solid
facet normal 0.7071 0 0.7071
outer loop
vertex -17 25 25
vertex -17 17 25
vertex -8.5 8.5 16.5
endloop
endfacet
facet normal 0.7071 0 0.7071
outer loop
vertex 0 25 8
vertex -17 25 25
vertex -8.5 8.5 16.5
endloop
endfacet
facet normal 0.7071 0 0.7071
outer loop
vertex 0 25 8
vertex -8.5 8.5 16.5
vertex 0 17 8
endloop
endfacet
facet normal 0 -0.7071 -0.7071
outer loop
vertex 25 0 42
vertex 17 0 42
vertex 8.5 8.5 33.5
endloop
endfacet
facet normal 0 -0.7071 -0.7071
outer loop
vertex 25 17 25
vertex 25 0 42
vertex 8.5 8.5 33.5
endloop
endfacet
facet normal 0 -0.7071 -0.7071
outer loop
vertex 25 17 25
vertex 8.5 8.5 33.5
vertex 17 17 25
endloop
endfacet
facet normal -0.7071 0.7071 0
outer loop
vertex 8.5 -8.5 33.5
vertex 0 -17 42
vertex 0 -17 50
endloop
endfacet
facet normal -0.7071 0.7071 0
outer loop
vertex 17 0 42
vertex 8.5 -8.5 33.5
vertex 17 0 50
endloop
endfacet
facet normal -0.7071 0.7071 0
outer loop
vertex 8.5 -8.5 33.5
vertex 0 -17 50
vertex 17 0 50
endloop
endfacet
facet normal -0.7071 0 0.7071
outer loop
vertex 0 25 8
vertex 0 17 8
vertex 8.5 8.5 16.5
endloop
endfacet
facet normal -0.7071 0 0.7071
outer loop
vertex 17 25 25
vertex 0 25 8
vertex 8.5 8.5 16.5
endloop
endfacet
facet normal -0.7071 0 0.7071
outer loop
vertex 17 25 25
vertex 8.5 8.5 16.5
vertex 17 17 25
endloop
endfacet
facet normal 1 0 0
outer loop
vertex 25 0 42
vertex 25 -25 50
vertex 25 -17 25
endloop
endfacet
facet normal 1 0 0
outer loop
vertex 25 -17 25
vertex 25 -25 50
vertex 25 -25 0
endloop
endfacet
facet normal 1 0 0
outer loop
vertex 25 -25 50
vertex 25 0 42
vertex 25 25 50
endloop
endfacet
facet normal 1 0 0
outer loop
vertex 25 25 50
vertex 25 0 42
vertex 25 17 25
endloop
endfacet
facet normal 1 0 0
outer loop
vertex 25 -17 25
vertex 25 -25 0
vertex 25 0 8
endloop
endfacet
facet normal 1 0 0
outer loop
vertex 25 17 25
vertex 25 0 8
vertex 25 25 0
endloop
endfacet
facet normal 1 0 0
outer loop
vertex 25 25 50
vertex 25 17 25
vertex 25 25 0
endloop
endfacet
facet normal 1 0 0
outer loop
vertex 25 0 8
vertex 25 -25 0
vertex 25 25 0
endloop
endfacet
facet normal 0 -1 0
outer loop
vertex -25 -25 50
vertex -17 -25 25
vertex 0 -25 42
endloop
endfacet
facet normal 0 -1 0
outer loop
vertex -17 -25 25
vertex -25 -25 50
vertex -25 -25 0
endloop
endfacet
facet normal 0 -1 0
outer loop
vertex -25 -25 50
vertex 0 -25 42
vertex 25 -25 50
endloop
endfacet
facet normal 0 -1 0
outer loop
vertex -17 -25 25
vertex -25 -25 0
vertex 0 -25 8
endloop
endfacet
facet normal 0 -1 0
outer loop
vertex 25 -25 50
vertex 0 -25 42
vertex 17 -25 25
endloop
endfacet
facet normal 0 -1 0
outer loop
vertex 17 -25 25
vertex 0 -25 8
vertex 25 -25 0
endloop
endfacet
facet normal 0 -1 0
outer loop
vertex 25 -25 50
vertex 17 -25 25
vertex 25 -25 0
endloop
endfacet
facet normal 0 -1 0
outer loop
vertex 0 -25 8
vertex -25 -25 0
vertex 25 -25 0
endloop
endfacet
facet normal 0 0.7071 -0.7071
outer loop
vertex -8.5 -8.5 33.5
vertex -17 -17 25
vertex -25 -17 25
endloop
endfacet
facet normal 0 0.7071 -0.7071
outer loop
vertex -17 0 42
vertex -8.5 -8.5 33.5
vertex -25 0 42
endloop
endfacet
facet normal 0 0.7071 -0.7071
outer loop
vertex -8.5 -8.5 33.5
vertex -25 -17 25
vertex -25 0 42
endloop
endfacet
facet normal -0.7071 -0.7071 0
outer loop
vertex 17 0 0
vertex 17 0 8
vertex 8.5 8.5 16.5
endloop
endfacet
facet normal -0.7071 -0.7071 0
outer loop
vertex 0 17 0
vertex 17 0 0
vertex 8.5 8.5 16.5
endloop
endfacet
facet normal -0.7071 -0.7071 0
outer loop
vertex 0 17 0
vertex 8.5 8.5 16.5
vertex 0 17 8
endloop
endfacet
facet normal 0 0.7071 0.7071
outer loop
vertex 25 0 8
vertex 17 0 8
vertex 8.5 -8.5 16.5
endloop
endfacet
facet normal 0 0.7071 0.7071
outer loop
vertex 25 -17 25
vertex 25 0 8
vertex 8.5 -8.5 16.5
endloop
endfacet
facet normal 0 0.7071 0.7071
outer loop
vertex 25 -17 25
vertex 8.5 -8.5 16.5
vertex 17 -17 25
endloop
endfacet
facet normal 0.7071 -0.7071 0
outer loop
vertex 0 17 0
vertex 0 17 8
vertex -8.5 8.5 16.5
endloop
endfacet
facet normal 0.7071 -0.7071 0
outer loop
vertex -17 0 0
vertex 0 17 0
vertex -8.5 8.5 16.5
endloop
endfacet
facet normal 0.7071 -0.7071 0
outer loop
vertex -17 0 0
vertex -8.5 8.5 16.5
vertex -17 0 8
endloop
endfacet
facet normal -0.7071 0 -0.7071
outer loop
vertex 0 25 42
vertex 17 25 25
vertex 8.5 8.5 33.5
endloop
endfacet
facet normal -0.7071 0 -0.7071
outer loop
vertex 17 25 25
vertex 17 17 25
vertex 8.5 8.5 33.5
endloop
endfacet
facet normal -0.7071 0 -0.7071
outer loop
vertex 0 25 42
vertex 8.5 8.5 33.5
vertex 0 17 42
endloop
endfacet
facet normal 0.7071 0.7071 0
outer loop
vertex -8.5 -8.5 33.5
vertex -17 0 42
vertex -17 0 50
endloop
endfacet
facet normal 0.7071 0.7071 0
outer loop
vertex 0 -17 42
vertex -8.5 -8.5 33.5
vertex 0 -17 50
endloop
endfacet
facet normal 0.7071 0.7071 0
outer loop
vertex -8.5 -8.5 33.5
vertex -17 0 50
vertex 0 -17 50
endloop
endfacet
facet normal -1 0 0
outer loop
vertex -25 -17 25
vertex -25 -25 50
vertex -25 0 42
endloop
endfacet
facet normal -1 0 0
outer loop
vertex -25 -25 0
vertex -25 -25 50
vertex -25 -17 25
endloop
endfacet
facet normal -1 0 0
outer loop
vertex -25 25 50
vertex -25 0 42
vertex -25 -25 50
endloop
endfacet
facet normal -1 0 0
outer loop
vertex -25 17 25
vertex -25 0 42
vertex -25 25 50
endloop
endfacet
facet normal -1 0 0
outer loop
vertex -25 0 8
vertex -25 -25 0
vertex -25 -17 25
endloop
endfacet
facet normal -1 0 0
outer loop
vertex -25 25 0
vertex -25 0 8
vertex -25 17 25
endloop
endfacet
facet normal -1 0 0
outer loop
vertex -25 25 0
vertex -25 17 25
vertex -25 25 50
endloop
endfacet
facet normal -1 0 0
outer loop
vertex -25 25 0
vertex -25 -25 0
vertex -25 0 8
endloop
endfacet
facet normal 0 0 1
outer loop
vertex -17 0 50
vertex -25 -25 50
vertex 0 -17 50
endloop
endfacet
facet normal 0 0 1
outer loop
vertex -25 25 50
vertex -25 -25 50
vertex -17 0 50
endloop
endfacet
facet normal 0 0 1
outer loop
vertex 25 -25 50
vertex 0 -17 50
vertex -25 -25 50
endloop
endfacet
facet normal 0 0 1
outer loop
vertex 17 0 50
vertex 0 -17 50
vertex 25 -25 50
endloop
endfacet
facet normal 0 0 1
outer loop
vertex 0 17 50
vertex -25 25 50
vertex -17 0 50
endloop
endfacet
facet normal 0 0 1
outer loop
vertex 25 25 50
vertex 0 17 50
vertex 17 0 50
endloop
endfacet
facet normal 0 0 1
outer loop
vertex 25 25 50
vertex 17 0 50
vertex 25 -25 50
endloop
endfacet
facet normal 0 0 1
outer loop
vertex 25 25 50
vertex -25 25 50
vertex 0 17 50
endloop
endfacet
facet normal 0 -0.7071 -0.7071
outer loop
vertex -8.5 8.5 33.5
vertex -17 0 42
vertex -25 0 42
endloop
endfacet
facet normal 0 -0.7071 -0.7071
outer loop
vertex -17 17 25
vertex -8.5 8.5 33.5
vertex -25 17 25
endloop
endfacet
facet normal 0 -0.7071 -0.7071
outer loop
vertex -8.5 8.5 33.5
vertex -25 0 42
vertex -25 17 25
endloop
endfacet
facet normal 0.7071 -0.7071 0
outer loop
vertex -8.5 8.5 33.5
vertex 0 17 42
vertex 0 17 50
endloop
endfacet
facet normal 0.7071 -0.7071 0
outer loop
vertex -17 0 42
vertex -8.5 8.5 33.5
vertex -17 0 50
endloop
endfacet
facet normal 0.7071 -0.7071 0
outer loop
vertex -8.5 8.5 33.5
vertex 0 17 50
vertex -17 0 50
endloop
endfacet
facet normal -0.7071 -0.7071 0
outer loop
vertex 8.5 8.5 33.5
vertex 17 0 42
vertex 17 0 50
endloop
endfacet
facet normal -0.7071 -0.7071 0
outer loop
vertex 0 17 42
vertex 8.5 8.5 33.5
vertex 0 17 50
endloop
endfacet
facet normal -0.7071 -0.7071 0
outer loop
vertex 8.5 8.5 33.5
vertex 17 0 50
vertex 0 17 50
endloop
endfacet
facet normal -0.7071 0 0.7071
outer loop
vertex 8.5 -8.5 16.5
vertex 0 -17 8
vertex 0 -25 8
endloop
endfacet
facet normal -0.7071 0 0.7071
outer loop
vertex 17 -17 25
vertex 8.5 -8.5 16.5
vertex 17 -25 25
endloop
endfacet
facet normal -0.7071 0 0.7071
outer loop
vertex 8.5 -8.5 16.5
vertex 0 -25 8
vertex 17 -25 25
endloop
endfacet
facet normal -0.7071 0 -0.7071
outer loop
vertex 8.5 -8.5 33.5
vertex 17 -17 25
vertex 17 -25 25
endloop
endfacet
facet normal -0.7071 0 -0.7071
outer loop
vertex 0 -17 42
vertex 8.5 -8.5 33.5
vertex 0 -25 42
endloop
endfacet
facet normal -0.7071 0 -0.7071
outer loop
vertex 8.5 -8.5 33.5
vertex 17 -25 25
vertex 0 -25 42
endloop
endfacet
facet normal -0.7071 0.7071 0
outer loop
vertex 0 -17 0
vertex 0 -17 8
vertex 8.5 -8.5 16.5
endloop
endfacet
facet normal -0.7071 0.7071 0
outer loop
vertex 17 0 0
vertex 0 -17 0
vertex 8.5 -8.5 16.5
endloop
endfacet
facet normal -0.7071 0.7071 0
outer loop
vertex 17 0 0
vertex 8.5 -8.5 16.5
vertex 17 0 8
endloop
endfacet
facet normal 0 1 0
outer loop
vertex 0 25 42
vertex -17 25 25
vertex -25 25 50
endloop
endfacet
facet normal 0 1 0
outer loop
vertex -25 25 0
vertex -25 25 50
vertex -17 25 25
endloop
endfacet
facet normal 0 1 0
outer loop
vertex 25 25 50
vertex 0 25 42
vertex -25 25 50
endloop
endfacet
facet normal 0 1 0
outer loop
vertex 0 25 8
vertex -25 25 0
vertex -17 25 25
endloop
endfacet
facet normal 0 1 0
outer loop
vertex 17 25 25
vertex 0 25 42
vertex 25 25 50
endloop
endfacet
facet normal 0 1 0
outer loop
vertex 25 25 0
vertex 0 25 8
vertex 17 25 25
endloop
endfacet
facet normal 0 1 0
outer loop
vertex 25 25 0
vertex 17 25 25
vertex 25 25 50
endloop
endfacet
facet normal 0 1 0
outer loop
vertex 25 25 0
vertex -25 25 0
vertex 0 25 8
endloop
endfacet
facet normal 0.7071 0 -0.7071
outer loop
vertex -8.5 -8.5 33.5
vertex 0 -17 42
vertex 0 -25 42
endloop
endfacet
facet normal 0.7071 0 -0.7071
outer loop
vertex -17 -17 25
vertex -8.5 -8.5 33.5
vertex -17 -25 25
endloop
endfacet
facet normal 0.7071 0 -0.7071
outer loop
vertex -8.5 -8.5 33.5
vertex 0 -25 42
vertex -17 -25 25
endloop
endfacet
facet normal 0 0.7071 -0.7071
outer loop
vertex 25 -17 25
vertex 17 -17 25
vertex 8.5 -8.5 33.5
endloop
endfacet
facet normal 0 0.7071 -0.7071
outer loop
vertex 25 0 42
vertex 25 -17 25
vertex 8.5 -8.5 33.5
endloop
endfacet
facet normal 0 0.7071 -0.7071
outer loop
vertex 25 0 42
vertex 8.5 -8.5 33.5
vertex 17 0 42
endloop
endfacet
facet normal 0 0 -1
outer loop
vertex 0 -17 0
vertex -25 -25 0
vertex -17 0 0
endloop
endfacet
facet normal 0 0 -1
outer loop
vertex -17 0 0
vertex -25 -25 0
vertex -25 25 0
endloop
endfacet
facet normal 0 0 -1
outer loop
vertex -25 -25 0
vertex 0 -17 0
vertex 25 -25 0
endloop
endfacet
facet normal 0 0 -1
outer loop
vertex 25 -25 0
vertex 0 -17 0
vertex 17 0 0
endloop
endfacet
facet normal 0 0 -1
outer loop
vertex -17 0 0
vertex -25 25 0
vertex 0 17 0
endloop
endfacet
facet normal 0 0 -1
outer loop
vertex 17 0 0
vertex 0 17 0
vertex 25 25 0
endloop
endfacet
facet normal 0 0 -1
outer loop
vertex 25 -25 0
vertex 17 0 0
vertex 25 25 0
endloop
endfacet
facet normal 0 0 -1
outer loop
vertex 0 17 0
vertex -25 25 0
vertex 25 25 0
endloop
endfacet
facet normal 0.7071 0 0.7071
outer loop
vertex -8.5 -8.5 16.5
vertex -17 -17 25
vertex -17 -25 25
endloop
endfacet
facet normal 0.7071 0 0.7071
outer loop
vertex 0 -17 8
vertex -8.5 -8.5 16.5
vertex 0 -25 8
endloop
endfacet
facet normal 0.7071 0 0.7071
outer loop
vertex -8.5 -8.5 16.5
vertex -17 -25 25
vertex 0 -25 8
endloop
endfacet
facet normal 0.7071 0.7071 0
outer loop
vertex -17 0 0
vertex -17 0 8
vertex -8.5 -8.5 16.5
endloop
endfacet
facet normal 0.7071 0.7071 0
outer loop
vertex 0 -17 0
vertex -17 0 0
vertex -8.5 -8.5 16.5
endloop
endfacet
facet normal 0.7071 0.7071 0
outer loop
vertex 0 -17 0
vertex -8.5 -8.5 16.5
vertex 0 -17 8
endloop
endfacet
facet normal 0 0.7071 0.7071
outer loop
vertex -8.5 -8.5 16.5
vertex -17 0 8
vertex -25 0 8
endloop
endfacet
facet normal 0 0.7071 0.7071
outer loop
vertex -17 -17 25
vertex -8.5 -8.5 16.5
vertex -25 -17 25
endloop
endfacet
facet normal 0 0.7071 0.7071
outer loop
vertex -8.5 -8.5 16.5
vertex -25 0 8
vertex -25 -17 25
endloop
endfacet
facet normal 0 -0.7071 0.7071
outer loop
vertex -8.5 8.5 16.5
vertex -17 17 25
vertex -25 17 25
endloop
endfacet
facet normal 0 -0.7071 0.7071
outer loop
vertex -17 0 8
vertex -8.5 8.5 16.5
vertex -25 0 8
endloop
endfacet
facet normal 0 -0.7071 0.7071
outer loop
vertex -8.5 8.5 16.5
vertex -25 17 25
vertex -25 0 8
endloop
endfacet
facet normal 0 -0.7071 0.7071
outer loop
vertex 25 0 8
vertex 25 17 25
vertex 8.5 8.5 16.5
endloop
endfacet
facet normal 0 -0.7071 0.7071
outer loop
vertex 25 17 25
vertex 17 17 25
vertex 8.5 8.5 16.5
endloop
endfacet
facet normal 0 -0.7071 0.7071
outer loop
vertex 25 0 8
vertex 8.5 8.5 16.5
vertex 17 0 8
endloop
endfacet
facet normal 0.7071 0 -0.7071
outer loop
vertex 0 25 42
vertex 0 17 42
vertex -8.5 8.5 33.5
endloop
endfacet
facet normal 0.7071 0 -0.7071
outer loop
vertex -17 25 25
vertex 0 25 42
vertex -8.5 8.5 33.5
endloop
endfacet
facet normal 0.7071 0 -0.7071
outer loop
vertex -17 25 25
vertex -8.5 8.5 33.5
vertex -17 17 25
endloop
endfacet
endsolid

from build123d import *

# Parameters (mm, degrees)
F0_W     = 50
F0_H     = 50
F1_DEPTH = 50
F3_DEPTH = 50
F5_DEPTH = 50
F7_DEPTH = 50


with BuildPart() as f1:
    # F0 (on Top) → F1 (new body)
    with BuildSketch(Plane.XY):
        Rectangle(F0_W, F0_H)
    extrude(amount=F1_DEPTH)

    # F2 (on face) → F3 (cut)
    with BuildSketch(Plane(origin=(-25, 0, 0), x_dir=(0, -1, 0), z_dir=(-1, 0, 0))):
        Polygon((17, 24.999999), (0, 42), (-17, 25.000001), (0, 8), align=None)
    extrude(amount=-F3_DEPTH, mode=Mode.SUBTRACT)

    # F4 (on face) → F5 (cut)
    with BuildSketch(Plane.XZ.offset(25)):
        Polygon((17, 24.999998), (0, 42), (-17, 25.000002), (0, 8), align=None)
    extrude(amount=-F5_DEPTH, mode=Mode.SUBTRACT)

    # F6 (on face) → F7 (cut)
    with BuildSketch(Plane.XY.offset(50)):
        Polygon((17, 0), (0, 17), (-17, 0), (0, -17), align=None)
    extrude(amount=-F7_DEPTH, mode=Mode.SUBTRACT)


solid = f1.part
